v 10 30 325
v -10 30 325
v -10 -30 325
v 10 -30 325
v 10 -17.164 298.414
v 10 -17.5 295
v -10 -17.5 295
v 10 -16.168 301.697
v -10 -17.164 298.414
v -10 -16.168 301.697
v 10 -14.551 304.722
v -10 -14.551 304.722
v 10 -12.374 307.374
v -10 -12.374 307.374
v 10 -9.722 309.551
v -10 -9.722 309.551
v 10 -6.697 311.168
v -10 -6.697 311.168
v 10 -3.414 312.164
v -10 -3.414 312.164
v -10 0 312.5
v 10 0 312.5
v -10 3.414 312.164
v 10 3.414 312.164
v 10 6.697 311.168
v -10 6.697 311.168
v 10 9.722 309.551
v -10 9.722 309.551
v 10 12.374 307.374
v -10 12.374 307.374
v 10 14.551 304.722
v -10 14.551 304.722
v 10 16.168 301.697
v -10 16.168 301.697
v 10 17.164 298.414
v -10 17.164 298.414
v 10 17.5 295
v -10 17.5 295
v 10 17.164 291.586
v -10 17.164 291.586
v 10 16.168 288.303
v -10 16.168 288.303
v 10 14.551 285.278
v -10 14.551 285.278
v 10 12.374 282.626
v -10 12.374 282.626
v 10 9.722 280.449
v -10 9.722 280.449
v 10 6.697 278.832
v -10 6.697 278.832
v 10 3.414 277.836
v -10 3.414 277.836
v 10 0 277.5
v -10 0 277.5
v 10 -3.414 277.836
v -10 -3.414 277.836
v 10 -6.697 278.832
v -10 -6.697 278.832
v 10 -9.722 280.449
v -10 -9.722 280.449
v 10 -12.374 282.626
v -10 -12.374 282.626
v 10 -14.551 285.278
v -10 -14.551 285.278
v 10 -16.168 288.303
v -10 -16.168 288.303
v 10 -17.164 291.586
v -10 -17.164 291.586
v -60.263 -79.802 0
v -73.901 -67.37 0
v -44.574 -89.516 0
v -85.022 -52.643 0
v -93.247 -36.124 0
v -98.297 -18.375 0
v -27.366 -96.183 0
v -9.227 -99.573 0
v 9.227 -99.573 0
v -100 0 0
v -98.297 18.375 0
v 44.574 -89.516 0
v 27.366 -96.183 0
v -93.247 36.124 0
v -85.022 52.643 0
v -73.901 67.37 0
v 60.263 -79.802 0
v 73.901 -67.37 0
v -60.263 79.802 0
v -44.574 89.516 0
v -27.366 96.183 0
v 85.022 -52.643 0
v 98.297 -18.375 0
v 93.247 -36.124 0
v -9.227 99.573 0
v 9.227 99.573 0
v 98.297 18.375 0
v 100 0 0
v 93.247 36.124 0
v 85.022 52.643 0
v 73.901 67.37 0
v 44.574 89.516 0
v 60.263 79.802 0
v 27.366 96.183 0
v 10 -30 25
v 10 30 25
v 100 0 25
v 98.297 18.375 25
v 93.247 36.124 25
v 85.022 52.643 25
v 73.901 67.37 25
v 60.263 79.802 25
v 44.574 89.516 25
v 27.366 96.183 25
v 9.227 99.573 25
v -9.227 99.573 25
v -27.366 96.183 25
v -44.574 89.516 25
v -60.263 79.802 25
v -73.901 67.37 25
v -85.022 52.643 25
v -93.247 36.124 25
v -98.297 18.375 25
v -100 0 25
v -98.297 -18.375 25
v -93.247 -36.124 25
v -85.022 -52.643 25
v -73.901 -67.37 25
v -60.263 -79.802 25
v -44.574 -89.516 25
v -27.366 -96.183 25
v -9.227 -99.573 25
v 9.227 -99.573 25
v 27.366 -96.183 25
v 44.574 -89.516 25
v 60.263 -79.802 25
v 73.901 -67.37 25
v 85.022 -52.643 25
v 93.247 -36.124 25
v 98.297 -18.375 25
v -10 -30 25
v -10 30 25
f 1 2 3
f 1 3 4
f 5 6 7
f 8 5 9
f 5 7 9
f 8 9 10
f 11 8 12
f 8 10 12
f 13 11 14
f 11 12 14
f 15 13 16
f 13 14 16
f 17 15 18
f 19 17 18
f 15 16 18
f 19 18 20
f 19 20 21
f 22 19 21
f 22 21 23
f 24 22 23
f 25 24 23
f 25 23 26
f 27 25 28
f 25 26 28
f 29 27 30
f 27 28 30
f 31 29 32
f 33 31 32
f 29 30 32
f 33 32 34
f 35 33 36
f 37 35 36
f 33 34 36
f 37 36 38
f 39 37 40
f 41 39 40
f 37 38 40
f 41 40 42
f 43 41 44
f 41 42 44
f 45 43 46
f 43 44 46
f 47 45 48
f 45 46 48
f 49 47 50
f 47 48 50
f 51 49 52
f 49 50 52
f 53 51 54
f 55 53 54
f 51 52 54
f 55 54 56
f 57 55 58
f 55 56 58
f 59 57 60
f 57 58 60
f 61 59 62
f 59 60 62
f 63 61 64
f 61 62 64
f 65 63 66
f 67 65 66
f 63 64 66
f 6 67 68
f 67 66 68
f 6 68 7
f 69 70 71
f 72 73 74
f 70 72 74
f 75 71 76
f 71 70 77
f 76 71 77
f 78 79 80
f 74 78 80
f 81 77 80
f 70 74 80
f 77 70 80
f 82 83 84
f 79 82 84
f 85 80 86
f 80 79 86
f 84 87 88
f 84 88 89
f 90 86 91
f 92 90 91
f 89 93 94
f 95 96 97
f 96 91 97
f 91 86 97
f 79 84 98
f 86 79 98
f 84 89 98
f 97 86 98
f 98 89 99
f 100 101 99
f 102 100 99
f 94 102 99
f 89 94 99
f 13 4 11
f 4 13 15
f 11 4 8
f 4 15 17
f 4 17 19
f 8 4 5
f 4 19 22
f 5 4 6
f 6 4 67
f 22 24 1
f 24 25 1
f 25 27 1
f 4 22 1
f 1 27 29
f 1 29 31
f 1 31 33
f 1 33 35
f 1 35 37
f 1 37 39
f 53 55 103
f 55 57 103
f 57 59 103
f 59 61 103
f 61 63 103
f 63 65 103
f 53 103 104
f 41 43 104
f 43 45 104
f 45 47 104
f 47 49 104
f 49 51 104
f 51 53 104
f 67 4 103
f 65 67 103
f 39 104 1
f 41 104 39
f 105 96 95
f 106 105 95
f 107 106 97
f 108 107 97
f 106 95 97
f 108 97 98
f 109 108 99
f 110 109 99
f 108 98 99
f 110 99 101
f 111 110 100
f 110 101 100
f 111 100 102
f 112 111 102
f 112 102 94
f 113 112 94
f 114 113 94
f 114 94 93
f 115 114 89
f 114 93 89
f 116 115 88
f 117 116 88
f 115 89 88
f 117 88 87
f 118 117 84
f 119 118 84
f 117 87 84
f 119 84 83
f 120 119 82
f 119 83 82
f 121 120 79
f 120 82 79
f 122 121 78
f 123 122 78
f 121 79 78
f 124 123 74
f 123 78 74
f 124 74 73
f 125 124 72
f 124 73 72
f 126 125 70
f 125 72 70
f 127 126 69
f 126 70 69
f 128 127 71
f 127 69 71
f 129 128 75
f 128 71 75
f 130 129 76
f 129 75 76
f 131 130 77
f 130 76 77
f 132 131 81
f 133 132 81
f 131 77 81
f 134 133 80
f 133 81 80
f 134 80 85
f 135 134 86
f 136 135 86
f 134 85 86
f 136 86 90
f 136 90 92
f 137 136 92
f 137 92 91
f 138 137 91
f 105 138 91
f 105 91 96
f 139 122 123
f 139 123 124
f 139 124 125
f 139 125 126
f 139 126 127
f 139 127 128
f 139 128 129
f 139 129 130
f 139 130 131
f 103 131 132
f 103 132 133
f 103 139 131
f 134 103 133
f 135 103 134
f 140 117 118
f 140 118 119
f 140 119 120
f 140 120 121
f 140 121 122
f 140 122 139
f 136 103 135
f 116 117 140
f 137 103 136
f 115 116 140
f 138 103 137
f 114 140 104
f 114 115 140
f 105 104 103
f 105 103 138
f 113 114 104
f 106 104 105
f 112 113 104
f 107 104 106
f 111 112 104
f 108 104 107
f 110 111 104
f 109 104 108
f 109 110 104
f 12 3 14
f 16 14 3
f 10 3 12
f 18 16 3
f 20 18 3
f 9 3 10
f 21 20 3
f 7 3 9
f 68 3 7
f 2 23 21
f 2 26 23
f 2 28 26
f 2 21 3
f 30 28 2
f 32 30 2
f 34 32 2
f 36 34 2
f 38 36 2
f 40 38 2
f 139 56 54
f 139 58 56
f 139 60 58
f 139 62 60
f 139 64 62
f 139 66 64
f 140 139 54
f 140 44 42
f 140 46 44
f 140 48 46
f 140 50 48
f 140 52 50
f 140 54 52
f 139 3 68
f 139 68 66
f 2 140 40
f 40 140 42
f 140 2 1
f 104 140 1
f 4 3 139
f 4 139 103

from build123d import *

# Parameters (mm, degrees)
F0_R     = 100
F1_DEPTH = 25
F2_W     = 20
F2_H     = 60
F3_DEPTH = 300
F4_R     = 17.5
F5_DEPTH = 20


with BuildPart() as f1:
    # F0 (on Top) → F1 (new body)
    with BuildSketch(Plane.XY):
        Circle(F0_R)
    extrude(amount=F1_DEPTH)

    # F2 (on face) → F3 (join)
    with BuildSketch(Plane.XY.offset(25)):
        Rectangle(F2_W, F2_H)
    extrude(amount=F3_DEPTH)

    # F4 (on face) → F5 (cut, through all)
    with BuildSketch(Plane(origin=(-10, 0, 0), x_dir=(0, -1, 0), z_dir=(-1, 0, 0))):
        with Locations((0, 295)):
            Circle(F4_R)
    extrude(amount=-F5_DEPTH, mode=Mode.SUBTRACT)


solid = f1.part
